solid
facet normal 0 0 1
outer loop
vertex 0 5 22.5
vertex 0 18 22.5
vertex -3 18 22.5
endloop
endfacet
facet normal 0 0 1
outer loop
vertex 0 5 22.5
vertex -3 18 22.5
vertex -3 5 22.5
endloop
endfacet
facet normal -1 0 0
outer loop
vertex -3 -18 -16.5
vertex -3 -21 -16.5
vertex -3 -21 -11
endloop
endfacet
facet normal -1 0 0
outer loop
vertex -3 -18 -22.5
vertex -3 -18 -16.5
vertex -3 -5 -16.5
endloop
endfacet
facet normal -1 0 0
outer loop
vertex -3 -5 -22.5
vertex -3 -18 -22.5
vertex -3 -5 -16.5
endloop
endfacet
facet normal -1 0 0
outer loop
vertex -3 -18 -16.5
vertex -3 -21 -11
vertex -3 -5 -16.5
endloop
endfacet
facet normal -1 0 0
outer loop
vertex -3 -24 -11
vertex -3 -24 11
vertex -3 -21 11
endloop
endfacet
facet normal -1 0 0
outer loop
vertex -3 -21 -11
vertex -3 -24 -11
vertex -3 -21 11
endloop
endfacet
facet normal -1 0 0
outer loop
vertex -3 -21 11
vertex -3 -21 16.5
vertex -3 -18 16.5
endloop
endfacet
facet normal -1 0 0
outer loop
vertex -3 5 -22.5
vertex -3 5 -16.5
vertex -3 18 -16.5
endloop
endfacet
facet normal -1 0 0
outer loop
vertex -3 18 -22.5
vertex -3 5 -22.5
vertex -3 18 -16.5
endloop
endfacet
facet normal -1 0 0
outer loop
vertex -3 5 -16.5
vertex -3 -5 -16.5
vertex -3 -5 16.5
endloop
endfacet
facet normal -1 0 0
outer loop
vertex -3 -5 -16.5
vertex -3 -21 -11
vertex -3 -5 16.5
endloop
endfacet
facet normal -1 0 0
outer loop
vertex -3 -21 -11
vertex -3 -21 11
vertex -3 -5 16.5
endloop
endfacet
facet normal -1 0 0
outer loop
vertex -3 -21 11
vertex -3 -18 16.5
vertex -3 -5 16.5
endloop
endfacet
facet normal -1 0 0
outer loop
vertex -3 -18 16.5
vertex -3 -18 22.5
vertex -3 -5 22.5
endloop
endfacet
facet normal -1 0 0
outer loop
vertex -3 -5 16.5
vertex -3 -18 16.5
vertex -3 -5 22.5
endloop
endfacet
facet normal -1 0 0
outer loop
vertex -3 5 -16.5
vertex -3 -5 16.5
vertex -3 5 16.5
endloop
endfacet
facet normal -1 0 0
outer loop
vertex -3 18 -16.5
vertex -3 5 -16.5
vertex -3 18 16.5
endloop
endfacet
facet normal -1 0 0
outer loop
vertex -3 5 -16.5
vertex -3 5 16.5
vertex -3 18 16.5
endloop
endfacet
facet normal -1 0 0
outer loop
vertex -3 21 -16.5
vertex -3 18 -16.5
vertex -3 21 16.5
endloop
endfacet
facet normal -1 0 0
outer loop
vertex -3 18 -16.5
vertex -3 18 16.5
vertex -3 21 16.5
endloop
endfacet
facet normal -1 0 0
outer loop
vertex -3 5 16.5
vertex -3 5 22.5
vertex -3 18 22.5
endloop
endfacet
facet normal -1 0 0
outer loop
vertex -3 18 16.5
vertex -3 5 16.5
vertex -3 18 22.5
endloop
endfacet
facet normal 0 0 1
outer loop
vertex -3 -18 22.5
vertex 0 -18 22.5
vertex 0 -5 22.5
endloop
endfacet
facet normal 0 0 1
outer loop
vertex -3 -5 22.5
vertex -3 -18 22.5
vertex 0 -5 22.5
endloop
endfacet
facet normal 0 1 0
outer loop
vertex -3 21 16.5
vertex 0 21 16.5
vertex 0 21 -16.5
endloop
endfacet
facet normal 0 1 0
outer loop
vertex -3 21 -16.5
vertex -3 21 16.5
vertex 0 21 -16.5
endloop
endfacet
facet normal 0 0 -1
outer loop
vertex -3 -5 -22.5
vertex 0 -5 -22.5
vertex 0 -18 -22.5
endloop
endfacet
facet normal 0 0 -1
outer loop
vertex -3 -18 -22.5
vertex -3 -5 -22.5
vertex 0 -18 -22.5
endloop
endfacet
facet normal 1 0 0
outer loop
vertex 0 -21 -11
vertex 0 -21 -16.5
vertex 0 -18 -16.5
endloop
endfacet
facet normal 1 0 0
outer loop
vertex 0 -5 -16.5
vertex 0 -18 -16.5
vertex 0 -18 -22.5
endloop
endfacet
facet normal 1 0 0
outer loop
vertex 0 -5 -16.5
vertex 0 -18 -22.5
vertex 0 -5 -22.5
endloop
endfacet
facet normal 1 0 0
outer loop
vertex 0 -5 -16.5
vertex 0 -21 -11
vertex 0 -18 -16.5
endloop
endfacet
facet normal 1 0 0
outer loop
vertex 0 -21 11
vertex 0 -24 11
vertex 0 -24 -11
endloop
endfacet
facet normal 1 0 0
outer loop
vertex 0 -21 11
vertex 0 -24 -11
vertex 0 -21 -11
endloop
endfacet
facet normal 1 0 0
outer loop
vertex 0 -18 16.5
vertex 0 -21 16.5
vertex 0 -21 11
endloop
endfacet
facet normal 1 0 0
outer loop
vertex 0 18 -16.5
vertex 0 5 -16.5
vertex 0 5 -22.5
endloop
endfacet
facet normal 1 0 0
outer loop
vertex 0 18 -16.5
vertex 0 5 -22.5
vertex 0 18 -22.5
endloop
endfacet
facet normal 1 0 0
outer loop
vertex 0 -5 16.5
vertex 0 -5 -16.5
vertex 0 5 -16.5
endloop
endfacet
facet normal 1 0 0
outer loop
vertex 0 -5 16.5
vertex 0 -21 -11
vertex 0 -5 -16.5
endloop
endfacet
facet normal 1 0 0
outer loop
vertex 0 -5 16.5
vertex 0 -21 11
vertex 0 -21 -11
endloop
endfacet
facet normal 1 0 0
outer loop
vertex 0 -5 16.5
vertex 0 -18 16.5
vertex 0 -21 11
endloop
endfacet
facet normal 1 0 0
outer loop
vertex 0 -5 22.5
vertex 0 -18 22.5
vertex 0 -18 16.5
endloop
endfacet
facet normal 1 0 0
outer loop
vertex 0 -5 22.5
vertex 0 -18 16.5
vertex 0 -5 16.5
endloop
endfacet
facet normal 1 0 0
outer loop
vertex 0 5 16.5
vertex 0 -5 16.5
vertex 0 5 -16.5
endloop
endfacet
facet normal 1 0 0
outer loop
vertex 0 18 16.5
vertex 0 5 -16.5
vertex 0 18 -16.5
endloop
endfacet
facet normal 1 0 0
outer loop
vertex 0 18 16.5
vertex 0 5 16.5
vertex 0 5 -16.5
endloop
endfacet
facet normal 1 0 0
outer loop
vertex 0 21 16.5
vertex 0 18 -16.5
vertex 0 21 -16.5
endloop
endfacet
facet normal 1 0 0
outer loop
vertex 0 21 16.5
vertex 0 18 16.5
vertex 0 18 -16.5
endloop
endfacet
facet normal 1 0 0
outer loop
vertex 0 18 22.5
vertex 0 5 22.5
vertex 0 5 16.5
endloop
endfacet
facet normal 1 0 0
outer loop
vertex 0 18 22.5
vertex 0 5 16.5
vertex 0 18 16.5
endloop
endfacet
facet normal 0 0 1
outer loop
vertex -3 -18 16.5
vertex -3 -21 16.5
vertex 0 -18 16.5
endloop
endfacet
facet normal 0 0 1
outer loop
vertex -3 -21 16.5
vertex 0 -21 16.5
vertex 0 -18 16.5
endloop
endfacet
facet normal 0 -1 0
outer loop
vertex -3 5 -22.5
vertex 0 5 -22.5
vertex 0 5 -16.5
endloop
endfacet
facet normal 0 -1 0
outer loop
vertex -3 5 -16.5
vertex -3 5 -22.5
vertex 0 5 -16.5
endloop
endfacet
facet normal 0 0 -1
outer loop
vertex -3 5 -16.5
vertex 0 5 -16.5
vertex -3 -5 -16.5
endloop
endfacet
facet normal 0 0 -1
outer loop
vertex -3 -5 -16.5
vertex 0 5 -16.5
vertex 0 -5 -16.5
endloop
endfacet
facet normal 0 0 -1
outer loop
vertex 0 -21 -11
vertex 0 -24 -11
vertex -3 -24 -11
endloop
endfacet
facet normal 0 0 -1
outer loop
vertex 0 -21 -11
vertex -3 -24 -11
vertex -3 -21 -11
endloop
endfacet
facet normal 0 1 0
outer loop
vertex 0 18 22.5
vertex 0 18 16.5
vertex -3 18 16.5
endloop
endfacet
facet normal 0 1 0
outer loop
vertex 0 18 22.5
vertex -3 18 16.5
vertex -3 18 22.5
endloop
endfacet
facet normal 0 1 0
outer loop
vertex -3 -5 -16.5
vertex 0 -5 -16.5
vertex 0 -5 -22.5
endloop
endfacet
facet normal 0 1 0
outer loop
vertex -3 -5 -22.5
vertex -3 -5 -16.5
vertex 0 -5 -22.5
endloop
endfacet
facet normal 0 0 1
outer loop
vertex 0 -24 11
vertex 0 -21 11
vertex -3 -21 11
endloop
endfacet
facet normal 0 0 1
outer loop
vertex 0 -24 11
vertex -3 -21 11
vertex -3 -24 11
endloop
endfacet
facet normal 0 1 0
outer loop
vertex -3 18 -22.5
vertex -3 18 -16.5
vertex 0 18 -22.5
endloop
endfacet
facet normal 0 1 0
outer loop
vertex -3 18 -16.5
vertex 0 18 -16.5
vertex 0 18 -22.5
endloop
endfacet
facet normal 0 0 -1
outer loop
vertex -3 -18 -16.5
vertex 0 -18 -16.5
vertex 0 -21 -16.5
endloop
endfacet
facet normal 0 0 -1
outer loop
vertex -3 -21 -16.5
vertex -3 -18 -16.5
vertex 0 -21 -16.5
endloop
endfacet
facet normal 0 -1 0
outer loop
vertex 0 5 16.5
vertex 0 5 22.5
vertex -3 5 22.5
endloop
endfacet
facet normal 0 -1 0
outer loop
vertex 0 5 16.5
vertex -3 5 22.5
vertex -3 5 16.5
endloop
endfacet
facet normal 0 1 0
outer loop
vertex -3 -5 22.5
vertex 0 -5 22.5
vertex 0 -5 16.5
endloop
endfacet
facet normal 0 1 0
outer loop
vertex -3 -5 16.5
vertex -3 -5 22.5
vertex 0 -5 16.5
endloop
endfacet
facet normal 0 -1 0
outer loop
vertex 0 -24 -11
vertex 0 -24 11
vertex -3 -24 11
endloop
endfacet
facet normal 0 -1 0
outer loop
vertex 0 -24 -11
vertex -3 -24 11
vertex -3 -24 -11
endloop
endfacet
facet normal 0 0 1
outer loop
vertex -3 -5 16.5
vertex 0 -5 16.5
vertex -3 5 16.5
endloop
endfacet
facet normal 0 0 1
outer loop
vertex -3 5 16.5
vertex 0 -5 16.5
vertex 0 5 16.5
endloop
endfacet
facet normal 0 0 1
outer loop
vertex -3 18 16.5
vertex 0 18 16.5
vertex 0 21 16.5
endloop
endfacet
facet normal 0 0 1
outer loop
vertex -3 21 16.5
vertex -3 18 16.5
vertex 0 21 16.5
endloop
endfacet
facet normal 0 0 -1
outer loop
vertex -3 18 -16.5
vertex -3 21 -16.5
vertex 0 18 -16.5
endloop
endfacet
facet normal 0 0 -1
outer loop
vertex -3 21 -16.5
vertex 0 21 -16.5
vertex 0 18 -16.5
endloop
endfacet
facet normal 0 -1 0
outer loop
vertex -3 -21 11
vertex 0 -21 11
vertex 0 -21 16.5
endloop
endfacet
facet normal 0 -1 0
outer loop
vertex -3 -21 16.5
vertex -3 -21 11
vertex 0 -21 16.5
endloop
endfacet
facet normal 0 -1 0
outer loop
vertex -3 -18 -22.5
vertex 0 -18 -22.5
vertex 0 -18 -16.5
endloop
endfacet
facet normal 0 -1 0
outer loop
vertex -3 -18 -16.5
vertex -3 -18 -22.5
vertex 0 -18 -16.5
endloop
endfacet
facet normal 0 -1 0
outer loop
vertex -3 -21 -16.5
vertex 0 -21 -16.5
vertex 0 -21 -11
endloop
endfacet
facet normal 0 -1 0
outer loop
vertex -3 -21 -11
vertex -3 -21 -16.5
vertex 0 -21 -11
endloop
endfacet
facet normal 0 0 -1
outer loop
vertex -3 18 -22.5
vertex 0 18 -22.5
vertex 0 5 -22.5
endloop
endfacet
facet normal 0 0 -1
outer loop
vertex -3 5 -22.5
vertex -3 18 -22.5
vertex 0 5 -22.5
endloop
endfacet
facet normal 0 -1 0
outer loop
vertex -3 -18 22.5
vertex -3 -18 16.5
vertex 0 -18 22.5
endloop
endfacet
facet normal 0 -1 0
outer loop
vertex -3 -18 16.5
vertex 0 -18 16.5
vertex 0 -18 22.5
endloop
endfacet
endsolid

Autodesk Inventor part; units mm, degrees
ref_plane "YZ Plane" through (0, 0, 0) normal (1, 0, 0) x (0, 1, 0)
ref_plane "XZ Plane" through (0, 0, 0) normal (0, 1, 0) x (-1, 0, 0)
ref_plane "XY Plane" through (0, 0, 0) normal (0, 0, 1) x (1, 0, 0)
sketch "Sketch2" plane through (0, 0, 0) normal (1, 0, 0) x (0, 1, 0)
  line L0 (21, -16.5) -> (18, -16.5)
  line L1 (-21, -16.5) -> (-21, -11)
  line L2 (-21, 16.5) -> (-18, 16.5)
  line L3 (21, 16.5) -> (21, -16.5)
  line L4 (21, -16.5) -> (-21, 16.5) construction
  line L5 (-21, -16.5) -> (21, 16.5) construction
  line L6 (0, -31.5) -> (0, 31.5) construction
  line L7 (-33, 0) -> (30, 0) construction
  line L8 (18, 16.5) -> (18, 22.5)
  line L9 (18, 22.5) -> (5, 22.5)
  line L10 (5, 22.5) -> (5, 16.5)
  line L11 (18, 16.5) -> (21, 16.5)
  line L12 (5, 16.5) -> (18, 16.5)
  line L13 (0, 16.5) -> (5, 16.5)
  line L14 (-18, 16.5) -> (-18, 22.5)
  line L15 (-18, 22.5) -> (-5, 22.5)
  line L16 (-5, 22.5) -> (-5, 16.5)
  line L17 (18, -16.5) -> (5, -16.5)
  line L18 (5, -16.5) -> (-5, -16.5)
  line L19 (-5, -16.5) -> (-18, -16.5)
  line L20 (-18, -16.5) -> (-21, -16.5)
  line L21 (-18, 16.5) -> (-5, 16.5)
  line L22 (-5, 16.5) -> (0, 16.5)
  line L23 (-21, 11) -> (-24, 11)
  line L24 (-24, 11) -> (-24, -11)
  line L25 (-24, -11) -> (-21, -11)
  line L26 (-21, 11) -> (-21, 16.5)
  line L27 (-21, -11) -> (-21, 11)
  line L28 (18, -16.5) -> (18, -22.5)
  line L29 (18, -22.5) -> (5, -22.5)
  line L30 (5, -22.5) -> (5, -16.5)
  line L31 (-5, -16.5) -> (-5, -22.5)
  line L32 (-5, -22.5) -> (-18, -22.5)
  line L33 (-18, -22.5) -> (-18, -16.5)
  point P0 (0, 0)
  dimension "d4" = 42
  dimension "d5" = 33
  dimension "d9" = 6
  dimension "d11" = 3
  dimension "d12" = 22
  dimension "d13" = 6
  dimension "d16" = 3
  dimension "d17" = 5
extrude "Extrusion2" add sketch "Sketch2" against normal blind 3
equation "\"d12\" = 0.666667 * d5"
properties part number "X-Motor-Housing_Motor-Side"
